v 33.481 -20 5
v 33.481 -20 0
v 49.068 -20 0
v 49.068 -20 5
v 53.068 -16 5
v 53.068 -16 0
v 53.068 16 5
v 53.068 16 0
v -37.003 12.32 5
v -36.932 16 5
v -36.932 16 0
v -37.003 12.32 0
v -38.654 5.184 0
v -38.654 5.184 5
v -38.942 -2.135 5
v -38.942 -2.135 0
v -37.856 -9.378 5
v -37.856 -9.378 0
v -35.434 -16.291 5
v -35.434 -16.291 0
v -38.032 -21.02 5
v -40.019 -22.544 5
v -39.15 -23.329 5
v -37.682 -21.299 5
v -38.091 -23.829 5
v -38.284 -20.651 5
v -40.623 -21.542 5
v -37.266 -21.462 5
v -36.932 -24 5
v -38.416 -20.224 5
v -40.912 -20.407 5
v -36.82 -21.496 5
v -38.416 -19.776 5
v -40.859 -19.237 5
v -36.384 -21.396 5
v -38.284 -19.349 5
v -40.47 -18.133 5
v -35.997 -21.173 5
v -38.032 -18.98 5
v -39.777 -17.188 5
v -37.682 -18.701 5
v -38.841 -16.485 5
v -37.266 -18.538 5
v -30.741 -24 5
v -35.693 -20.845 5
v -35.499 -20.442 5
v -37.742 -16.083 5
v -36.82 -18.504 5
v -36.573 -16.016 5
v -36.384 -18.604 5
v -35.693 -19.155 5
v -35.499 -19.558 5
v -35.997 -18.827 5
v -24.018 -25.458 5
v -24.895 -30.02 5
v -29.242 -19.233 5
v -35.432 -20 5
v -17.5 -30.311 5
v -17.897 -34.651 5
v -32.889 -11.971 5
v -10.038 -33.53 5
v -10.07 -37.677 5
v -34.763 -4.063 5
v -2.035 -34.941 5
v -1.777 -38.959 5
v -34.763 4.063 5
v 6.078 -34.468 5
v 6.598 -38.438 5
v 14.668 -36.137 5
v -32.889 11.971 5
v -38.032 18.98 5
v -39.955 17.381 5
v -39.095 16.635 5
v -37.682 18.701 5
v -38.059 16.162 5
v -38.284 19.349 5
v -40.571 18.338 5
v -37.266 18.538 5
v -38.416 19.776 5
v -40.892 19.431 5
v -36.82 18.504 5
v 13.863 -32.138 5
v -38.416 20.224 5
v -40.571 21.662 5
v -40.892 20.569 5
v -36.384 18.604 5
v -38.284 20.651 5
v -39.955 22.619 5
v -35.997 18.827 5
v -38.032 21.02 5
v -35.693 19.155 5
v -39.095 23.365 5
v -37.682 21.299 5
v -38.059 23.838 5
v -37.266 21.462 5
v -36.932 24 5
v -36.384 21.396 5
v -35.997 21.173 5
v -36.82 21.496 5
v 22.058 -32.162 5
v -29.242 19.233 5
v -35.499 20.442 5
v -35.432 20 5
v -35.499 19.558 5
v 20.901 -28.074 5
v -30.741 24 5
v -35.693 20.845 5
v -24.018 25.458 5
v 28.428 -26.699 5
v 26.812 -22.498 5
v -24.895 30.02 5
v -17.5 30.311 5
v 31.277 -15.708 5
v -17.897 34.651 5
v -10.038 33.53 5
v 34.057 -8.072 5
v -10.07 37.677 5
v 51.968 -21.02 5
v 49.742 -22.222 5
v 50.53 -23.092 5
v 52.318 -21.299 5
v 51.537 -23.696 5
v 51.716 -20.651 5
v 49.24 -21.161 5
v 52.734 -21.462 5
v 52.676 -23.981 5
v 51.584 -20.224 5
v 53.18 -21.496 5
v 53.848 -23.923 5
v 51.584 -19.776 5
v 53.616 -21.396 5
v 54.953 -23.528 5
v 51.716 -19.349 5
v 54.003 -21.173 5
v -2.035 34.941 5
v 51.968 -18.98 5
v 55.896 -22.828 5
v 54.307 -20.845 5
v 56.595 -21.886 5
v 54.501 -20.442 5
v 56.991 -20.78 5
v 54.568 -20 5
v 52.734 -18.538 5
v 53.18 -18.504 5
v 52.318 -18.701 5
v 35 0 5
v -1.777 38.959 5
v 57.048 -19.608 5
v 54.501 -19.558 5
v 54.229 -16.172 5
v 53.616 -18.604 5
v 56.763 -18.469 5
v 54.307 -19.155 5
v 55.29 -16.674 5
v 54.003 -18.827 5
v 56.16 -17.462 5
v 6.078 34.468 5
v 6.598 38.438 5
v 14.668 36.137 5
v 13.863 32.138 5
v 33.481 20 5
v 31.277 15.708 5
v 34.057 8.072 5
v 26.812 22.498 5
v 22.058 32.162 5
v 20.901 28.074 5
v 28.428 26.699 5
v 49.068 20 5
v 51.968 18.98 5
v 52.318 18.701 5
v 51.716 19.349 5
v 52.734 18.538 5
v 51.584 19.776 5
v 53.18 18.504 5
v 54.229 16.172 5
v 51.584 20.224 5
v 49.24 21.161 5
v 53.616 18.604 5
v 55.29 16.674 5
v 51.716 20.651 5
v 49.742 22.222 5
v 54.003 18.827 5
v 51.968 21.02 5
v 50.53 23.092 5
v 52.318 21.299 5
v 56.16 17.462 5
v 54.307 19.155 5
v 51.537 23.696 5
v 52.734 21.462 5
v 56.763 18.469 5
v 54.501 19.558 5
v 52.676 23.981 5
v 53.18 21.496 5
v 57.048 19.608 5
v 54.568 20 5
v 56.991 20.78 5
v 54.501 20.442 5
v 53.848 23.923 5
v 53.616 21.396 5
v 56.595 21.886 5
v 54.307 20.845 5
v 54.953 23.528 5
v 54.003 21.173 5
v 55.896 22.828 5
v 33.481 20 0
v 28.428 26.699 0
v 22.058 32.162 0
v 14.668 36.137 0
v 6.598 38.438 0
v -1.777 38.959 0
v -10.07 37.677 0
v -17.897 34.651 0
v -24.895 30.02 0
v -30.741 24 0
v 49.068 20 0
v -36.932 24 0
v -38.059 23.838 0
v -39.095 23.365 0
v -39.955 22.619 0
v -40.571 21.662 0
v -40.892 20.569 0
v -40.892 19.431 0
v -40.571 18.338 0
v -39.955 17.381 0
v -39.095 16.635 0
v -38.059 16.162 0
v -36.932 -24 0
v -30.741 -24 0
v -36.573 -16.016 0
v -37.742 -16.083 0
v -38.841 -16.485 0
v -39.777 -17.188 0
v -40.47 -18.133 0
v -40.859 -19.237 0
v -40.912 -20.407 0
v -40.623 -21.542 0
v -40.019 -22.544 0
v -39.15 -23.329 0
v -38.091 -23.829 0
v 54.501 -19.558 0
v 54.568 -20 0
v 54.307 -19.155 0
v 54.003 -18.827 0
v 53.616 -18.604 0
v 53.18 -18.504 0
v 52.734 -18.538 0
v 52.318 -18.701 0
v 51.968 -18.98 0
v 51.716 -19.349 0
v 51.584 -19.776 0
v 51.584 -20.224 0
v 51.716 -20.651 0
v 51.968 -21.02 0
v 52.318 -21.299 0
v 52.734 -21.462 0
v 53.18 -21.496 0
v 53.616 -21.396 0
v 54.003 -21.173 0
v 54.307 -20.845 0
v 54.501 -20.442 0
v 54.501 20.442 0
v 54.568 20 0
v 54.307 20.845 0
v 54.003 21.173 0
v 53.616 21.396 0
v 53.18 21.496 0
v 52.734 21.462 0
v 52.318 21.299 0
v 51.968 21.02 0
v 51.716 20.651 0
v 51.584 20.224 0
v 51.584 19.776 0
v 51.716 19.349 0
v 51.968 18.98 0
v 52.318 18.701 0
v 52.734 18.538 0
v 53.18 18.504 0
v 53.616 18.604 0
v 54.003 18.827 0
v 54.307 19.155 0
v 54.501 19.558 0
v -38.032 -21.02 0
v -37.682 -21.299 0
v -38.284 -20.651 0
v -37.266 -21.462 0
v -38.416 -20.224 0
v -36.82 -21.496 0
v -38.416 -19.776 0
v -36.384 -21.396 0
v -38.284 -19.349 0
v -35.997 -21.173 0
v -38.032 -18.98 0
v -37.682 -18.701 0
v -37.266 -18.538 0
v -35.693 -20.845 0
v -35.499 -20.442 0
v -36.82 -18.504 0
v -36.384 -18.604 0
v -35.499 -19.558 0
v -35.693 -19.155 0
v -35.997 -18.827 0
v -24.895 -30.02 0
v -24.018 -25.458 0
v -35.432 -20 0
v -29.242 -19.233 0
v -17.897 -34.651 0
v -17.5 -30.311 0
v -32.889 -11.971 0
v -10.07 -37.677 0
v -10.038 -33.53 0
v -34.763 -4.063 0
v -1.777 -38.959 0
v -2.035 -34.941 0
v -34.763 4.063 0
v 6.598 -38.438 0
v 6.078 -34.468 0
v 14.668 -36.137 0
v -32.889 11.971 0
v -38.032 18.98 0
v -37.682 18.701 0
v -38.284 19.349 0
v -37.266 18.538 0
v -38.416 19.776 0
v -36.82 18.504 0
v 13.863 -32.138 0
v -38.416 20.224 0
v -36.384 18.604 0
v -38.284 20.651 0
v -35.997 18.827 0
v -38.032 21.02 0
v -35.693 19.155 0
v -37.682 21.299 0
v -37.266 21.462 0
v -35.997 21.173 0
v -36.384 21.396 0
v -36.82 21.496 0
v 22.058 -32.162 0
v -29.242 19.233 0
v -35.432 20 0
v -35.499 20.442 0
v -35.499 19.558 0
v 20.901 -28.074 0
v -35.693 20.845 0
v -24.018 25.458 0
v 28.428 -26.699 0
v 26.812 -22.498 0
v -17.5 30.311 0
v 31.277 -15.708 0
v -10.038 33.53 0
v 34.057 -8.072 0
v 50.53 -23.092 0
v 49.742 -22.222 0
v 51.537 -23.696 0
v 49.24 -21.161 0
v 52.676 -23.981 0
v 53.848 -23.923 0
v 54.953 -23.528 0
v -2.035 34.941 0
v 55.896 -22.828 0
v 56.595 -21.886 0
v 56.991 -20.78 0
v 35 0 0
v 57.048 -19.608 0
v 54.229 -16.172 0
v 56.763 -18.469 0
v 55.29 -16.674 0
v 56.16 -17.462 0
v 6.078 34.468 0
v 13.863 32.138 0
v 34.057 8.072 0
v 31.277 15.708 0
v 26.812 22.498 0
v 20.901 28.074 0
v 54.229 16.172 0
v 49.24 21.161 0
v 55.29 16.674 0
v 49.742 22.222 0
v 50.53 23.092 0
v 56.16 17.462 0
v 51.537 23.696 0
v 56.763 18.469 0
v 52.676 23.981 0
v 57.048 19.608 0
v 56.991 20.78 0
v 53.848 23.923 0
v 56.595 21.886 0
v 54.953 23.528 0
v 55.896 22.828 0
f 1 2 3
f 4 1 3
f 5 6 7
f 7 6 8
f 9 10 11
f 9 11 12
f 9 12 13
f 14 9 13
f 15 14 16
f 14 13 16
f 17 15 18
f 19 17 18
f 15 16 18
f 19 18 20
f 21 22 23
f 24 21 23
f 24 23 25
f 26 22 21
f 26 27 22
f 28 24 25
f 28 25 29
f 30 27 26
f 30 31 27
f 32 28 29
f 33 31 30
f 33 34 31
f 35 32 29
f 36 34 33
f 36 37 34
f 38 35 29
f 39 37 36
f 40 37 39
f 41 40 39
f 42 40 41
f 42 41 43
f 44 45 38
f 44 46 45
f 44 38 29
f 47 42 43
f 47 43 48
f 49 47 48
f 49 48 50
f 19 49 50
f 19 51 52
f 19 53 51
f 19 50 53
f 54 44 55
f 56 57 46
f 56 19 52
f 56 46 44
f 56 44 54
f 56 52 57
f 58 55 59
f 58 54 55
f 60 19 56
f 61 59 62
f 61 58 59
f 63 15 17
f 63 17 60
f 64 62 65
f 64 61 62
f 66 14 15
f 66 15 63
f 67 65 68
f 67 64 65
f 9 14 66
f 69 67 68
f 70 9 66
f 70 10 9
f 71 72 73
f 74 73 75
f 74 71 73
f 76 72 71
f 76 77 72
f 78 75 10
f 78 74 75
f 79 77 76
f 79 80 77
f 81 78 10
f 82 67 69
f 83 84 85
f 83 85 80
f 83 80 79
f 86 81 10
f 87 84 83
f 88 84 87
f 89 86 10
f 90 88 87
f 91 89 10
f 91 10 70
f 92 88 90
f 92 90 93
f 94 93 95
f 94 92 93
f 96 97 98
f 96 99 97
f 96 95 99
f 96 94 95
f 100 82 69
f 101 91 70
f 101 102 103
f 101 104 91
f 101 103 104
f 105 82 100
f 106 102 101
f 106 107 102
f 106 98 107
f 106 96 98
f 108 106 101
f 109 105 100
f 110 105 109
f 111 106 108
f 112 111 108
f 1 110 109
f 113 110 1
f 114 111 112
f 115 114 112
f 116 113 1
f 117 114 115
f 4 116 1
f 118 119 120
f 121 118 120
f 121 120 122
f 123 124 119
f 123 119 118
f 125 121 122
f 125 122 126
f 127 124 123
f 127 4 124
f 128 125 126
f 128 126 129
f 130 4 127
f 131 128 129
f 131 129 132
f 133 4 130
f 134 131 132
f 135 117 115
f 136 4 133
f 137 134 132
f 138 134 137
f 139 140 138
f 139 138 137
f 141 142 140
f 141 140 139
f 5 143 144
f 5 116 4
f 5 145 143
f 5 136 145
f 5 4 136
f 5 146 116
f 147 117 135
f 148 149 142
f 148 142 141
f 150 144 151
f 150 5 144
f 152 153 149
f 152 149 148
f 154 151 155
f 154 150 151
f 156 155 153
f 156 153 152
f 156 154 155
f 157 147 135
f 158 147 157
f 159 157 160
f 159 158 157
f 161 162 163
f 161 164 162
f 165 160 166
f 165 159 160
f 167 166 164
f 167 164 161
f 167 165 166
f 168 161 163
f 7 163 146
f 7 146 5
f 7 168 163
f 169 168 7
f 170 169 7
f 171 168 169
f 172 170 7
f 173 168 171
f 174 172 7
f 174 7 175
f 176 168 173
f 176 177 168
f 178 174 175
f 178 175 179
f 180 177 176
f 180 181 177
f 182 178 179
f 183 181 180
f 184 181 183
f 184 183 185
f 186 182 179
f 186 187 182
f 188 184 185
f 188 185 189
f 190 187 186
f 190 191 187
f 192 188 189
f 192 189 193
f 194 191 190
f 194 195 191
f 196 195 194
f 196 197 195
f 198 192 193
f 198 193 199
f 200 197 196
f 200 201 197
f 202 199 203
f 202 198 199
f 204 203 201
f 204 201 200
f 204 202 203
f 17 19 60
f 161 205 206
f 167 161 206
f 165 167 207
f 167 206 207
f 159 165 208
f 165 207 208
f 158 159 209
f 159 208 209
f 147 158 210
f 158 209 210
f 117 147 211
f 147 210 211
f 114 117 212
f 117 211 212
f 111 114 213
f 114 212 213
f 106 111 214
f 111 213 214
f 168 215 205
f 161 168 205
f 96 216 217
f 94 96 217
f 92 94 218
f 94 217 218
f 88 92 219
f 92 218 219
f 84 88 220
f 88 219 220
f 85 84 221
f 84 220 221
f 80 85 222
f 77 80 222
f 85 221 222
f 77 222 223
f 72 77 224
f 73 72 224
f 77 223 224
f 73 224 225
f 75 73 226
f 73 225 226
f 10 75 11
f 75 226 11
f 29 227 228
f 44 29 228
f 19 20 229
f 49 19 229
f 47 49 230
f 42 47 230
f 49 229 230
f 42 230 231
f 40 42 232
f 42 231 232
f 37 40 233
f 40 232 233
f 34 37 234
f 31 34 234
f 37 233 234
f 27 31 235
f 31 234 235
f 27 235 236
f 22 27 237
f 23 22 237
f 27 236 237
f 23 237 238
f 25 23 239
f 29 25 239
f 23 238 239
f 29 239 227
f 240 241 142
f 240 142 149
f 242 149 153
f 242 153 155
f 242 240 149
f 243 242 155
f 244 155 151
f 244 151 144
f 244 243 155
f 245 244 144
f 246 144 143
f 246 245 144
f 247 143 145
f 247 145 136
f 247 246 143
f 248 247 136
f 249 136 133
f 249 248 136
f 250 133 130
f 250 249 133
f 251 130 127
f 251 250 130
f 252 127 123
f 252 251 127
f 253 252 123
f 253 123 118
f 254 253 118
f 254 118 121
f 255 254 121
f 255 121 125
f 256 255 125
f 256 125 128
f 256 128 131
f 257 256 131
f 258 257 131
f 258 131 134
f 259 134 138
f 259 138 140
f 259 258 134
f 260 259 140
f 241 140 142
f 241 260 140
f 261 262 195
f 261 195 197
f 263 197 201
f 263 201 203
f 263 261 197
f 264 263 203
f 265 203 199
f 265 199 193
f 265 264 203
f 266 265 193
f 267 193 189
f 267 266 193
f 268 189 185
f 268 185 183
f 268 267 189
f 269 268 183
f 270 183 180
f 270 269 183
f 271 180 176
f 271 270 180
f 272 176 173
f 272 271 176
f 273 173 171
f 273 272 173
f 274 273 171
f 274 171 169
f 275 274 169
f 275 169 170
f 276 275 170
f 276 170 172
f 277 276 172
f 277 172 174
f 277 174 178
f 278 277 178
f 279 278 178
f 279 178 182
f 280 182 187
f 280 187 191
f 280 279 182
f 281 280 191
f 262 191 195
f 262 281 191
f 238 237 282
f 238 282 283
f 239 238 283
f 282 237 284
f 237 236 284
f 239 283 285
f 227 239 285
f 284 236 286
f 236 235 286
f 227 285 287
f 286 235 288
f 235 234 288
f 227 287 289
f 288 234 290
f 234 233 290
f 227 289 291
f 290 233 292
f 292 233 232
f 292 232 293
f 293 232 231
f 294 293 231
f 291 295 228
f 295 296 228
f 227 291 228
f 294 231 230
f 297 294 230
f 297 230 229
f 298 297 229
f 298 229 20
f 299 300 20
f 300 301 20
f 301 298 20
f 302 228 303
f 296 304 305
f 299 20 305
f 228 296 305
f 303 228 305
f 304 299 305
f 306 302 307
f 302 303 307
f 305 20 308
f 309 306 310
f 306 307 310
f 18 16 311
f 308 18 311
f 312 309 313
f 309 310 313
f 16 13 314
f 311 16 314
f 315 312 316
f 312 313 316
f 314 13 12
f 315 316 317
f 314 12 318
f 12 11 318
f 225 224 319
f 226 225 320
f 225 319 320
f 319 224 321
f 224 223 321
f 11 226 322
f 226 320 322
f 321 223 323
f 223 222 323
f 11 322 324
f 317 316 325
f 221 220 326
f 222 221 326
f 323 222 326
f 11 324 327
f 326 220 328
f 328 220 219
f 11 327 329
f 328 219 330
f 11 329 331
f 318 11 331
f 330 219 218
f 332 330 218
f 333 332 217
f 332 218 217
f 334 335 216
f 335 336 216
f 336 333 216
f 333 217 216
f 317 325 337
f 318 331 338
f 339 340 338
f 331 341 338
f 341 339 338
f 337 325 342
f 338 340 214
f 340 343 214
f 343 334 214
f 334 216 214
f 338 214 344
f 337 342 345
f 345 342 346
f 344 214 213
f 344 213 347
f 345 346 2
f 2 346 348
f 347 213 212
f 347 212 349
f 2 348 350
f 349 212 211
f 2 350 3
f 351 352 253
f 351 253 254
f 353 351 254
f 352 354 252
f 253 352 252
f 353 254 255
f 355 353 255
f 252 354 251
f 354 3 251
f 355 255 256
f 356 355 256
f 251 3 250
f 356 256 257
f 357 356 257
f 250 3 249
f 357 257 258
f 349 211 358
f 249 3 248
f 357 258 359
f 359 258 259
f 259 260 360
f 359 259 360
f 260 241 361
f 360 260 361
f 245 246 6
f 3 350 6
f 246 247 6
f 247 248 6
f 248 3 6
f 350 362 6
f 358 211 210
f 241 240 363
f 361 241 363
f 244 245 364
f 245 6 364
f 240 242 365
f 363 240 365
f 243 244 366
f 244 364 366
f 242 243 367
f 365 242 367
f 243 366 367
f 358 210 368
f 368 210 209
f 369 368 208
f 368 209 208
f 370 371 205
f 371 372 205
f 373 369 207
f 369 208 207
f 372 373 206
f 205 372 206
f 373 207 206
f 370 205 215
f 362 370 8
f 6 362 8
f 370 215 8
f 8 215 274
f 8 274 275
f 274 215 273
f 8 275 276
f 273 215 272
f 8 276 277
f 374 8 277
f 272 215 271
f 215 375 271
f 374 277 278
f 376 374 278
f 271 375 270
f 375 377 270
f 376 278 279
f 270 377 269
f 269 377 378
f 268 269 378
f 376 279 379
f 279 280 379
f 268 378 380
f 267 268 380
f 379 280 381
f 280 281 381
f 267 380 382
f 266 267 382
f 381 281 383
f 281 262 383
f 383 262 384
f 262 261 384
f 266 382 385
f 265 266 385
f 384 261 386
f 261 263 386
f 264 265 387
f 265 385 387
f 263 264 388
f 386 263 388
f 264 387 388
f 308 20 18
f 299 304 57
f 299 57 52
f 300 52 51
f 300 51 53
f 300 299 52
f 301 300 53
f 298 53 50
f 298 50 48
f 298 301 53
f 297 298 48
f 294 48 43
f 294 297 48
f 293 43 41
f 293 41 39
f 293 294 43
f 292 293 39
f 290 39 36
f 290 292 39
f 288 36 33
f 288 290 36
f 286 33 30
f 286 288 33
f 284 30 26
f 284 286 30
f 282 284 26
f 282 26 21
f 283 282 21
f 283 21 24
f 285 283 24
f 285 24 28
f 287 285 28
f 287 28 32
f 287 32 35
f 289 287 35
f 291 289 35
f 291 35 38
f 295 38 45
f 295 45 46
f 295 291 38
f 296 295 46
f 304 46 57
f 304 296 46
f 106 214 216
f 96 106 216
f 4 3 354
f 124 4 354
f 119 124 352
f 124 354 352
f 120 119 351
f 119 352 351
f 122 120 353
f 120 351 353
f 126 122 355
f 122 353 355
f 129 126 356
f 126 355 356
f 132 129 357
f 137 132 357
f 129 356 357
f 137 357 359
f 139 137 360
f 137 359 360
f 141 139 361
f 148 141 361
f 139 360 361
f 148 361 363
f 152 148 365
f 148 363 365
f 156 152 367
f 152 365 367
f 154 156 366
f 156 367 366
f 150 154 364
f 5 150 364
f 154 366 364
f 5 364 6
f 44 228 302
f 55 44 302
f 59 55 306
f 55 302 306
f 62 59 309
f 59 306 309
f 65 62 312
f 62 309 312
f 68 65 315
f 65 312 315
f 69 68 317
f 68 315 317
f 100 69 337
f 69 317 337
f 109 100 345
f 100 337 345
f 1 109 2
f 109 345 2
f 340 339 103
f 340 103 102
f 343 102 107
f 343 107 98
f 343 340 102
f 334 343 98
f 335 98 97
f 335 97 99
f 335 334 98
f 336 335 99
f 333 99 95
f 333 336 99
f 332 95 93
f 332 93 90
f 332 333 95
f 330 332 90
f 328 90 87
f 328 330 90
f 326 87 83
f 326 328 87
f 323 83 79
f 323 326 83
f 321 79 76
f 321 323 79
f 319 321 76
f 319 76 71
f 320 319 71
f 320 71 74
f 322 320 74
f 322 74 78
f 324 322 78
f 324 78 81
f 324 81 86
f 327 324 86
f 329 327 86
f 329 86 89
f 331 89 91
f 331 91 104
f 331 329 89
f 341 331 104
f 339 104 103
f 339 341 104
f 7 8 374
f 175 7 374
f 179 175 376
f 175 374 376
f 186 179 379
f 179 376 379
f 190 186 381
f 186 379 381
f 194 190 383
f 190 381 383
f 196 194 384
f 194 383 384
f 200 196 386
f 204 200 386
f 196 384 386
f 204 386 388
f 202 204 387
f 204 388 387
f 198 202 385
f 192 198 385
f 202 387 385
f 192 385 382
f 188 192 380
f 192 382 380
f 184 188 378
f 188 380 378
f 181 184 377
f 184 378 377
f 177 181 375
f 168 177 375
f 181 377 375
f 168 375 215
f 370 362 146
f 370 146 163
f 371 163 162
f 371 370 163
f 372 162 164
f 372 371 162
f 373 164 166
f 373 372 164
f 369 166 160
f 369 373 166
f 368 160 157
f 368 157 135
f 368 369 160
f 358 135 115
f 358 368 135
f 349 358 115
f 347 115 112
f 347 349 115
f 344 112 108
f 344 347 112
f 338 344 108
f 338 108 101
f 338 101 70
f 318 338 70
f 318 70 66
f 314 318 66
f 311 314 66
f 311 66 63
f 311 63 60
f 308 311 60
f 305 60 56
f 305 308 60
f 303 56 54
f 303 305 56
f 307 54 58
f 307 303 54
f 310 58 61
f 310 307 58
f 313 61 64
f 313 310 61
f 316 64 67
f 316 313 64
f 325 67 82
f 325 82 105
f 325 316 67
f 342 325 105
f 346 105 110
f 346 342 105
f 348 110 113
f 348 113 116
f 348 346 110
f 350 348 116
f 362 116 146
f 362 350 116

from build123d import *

# Parameters (mm, degrees)
SKETCH1_R           = 1.5
SKETCH1_R_2         = 35
BOSS_EXTRUDE1_DEPTH = 5


with BuildPart() as part:
    # Sketch1 → Boss-Extrude1 (new body)
    with BuildSketch(Plane.XY):
        with BuildLine():
            Line((-30.740852298, 24), (-36.932370625, 24))
            ThreePointArc((-36.932370625, 24), (-40.932370625, 20), (-36.932370625, 16))
            Line((-36.932370625, 16), (-37.002837962, 12.320307738))
            ThreePointArc((-37.002837962, 12.320307738), (-38.941537608, -2.134630811), (-35.434469198, -16.291052533))
            ThreePointArc((-35.434469198, -16.291052533), (-40.858933363, -19.237041898), (-36.932370625, -24))
            Line((-36.932370625, -24), (-30.740852298, -24))
            ThreePointArc((-30.740852298, -24), (2.424369111, -38.924573657), (33.481338086, -20))
            Line((33.481338086, -20), (49.067629375, -20))
            ThreePointArc((49.067629375, -20), (55.8960565, -22.828427125), (53.067629375, -16))
            Line((53.067629375, -16), (53.067629375, 16))
            ThreePointArc((53.067629375, 16), (55.8960565, 22.828427125), (49.067629375, 20))
            Line((49.067629375, 20), (33.481338086, 20))
            ThreePointArc((33.481338086, 20), (2.424369111, 38.924573657), (-30.740852298, 24))
        make_face()
        with Locations((-36.932370625, -20)):
            Circle(SKETCH1_R, mode=Mode.SUBTRACT)
        with Locations((53.067629375, -20)):
            Circle(SKETCH1_R, mode=Mode.SUBTRACT)
        Circle(SKETCH1_R_2, mode=Mode.SUBTRACT)
        with Locations((-36.932370625, 20)):
            Circle(SKETCH1_R, mode=Mode.SUBTRACT)
        with Locations((53.067629375, 20)):
            Circle(SKETCH1_R, mode=Mode.SUBTRACT)
    extrude(amount=BOSS_EXTRUDE1_DEPTH)


solid = part.part
